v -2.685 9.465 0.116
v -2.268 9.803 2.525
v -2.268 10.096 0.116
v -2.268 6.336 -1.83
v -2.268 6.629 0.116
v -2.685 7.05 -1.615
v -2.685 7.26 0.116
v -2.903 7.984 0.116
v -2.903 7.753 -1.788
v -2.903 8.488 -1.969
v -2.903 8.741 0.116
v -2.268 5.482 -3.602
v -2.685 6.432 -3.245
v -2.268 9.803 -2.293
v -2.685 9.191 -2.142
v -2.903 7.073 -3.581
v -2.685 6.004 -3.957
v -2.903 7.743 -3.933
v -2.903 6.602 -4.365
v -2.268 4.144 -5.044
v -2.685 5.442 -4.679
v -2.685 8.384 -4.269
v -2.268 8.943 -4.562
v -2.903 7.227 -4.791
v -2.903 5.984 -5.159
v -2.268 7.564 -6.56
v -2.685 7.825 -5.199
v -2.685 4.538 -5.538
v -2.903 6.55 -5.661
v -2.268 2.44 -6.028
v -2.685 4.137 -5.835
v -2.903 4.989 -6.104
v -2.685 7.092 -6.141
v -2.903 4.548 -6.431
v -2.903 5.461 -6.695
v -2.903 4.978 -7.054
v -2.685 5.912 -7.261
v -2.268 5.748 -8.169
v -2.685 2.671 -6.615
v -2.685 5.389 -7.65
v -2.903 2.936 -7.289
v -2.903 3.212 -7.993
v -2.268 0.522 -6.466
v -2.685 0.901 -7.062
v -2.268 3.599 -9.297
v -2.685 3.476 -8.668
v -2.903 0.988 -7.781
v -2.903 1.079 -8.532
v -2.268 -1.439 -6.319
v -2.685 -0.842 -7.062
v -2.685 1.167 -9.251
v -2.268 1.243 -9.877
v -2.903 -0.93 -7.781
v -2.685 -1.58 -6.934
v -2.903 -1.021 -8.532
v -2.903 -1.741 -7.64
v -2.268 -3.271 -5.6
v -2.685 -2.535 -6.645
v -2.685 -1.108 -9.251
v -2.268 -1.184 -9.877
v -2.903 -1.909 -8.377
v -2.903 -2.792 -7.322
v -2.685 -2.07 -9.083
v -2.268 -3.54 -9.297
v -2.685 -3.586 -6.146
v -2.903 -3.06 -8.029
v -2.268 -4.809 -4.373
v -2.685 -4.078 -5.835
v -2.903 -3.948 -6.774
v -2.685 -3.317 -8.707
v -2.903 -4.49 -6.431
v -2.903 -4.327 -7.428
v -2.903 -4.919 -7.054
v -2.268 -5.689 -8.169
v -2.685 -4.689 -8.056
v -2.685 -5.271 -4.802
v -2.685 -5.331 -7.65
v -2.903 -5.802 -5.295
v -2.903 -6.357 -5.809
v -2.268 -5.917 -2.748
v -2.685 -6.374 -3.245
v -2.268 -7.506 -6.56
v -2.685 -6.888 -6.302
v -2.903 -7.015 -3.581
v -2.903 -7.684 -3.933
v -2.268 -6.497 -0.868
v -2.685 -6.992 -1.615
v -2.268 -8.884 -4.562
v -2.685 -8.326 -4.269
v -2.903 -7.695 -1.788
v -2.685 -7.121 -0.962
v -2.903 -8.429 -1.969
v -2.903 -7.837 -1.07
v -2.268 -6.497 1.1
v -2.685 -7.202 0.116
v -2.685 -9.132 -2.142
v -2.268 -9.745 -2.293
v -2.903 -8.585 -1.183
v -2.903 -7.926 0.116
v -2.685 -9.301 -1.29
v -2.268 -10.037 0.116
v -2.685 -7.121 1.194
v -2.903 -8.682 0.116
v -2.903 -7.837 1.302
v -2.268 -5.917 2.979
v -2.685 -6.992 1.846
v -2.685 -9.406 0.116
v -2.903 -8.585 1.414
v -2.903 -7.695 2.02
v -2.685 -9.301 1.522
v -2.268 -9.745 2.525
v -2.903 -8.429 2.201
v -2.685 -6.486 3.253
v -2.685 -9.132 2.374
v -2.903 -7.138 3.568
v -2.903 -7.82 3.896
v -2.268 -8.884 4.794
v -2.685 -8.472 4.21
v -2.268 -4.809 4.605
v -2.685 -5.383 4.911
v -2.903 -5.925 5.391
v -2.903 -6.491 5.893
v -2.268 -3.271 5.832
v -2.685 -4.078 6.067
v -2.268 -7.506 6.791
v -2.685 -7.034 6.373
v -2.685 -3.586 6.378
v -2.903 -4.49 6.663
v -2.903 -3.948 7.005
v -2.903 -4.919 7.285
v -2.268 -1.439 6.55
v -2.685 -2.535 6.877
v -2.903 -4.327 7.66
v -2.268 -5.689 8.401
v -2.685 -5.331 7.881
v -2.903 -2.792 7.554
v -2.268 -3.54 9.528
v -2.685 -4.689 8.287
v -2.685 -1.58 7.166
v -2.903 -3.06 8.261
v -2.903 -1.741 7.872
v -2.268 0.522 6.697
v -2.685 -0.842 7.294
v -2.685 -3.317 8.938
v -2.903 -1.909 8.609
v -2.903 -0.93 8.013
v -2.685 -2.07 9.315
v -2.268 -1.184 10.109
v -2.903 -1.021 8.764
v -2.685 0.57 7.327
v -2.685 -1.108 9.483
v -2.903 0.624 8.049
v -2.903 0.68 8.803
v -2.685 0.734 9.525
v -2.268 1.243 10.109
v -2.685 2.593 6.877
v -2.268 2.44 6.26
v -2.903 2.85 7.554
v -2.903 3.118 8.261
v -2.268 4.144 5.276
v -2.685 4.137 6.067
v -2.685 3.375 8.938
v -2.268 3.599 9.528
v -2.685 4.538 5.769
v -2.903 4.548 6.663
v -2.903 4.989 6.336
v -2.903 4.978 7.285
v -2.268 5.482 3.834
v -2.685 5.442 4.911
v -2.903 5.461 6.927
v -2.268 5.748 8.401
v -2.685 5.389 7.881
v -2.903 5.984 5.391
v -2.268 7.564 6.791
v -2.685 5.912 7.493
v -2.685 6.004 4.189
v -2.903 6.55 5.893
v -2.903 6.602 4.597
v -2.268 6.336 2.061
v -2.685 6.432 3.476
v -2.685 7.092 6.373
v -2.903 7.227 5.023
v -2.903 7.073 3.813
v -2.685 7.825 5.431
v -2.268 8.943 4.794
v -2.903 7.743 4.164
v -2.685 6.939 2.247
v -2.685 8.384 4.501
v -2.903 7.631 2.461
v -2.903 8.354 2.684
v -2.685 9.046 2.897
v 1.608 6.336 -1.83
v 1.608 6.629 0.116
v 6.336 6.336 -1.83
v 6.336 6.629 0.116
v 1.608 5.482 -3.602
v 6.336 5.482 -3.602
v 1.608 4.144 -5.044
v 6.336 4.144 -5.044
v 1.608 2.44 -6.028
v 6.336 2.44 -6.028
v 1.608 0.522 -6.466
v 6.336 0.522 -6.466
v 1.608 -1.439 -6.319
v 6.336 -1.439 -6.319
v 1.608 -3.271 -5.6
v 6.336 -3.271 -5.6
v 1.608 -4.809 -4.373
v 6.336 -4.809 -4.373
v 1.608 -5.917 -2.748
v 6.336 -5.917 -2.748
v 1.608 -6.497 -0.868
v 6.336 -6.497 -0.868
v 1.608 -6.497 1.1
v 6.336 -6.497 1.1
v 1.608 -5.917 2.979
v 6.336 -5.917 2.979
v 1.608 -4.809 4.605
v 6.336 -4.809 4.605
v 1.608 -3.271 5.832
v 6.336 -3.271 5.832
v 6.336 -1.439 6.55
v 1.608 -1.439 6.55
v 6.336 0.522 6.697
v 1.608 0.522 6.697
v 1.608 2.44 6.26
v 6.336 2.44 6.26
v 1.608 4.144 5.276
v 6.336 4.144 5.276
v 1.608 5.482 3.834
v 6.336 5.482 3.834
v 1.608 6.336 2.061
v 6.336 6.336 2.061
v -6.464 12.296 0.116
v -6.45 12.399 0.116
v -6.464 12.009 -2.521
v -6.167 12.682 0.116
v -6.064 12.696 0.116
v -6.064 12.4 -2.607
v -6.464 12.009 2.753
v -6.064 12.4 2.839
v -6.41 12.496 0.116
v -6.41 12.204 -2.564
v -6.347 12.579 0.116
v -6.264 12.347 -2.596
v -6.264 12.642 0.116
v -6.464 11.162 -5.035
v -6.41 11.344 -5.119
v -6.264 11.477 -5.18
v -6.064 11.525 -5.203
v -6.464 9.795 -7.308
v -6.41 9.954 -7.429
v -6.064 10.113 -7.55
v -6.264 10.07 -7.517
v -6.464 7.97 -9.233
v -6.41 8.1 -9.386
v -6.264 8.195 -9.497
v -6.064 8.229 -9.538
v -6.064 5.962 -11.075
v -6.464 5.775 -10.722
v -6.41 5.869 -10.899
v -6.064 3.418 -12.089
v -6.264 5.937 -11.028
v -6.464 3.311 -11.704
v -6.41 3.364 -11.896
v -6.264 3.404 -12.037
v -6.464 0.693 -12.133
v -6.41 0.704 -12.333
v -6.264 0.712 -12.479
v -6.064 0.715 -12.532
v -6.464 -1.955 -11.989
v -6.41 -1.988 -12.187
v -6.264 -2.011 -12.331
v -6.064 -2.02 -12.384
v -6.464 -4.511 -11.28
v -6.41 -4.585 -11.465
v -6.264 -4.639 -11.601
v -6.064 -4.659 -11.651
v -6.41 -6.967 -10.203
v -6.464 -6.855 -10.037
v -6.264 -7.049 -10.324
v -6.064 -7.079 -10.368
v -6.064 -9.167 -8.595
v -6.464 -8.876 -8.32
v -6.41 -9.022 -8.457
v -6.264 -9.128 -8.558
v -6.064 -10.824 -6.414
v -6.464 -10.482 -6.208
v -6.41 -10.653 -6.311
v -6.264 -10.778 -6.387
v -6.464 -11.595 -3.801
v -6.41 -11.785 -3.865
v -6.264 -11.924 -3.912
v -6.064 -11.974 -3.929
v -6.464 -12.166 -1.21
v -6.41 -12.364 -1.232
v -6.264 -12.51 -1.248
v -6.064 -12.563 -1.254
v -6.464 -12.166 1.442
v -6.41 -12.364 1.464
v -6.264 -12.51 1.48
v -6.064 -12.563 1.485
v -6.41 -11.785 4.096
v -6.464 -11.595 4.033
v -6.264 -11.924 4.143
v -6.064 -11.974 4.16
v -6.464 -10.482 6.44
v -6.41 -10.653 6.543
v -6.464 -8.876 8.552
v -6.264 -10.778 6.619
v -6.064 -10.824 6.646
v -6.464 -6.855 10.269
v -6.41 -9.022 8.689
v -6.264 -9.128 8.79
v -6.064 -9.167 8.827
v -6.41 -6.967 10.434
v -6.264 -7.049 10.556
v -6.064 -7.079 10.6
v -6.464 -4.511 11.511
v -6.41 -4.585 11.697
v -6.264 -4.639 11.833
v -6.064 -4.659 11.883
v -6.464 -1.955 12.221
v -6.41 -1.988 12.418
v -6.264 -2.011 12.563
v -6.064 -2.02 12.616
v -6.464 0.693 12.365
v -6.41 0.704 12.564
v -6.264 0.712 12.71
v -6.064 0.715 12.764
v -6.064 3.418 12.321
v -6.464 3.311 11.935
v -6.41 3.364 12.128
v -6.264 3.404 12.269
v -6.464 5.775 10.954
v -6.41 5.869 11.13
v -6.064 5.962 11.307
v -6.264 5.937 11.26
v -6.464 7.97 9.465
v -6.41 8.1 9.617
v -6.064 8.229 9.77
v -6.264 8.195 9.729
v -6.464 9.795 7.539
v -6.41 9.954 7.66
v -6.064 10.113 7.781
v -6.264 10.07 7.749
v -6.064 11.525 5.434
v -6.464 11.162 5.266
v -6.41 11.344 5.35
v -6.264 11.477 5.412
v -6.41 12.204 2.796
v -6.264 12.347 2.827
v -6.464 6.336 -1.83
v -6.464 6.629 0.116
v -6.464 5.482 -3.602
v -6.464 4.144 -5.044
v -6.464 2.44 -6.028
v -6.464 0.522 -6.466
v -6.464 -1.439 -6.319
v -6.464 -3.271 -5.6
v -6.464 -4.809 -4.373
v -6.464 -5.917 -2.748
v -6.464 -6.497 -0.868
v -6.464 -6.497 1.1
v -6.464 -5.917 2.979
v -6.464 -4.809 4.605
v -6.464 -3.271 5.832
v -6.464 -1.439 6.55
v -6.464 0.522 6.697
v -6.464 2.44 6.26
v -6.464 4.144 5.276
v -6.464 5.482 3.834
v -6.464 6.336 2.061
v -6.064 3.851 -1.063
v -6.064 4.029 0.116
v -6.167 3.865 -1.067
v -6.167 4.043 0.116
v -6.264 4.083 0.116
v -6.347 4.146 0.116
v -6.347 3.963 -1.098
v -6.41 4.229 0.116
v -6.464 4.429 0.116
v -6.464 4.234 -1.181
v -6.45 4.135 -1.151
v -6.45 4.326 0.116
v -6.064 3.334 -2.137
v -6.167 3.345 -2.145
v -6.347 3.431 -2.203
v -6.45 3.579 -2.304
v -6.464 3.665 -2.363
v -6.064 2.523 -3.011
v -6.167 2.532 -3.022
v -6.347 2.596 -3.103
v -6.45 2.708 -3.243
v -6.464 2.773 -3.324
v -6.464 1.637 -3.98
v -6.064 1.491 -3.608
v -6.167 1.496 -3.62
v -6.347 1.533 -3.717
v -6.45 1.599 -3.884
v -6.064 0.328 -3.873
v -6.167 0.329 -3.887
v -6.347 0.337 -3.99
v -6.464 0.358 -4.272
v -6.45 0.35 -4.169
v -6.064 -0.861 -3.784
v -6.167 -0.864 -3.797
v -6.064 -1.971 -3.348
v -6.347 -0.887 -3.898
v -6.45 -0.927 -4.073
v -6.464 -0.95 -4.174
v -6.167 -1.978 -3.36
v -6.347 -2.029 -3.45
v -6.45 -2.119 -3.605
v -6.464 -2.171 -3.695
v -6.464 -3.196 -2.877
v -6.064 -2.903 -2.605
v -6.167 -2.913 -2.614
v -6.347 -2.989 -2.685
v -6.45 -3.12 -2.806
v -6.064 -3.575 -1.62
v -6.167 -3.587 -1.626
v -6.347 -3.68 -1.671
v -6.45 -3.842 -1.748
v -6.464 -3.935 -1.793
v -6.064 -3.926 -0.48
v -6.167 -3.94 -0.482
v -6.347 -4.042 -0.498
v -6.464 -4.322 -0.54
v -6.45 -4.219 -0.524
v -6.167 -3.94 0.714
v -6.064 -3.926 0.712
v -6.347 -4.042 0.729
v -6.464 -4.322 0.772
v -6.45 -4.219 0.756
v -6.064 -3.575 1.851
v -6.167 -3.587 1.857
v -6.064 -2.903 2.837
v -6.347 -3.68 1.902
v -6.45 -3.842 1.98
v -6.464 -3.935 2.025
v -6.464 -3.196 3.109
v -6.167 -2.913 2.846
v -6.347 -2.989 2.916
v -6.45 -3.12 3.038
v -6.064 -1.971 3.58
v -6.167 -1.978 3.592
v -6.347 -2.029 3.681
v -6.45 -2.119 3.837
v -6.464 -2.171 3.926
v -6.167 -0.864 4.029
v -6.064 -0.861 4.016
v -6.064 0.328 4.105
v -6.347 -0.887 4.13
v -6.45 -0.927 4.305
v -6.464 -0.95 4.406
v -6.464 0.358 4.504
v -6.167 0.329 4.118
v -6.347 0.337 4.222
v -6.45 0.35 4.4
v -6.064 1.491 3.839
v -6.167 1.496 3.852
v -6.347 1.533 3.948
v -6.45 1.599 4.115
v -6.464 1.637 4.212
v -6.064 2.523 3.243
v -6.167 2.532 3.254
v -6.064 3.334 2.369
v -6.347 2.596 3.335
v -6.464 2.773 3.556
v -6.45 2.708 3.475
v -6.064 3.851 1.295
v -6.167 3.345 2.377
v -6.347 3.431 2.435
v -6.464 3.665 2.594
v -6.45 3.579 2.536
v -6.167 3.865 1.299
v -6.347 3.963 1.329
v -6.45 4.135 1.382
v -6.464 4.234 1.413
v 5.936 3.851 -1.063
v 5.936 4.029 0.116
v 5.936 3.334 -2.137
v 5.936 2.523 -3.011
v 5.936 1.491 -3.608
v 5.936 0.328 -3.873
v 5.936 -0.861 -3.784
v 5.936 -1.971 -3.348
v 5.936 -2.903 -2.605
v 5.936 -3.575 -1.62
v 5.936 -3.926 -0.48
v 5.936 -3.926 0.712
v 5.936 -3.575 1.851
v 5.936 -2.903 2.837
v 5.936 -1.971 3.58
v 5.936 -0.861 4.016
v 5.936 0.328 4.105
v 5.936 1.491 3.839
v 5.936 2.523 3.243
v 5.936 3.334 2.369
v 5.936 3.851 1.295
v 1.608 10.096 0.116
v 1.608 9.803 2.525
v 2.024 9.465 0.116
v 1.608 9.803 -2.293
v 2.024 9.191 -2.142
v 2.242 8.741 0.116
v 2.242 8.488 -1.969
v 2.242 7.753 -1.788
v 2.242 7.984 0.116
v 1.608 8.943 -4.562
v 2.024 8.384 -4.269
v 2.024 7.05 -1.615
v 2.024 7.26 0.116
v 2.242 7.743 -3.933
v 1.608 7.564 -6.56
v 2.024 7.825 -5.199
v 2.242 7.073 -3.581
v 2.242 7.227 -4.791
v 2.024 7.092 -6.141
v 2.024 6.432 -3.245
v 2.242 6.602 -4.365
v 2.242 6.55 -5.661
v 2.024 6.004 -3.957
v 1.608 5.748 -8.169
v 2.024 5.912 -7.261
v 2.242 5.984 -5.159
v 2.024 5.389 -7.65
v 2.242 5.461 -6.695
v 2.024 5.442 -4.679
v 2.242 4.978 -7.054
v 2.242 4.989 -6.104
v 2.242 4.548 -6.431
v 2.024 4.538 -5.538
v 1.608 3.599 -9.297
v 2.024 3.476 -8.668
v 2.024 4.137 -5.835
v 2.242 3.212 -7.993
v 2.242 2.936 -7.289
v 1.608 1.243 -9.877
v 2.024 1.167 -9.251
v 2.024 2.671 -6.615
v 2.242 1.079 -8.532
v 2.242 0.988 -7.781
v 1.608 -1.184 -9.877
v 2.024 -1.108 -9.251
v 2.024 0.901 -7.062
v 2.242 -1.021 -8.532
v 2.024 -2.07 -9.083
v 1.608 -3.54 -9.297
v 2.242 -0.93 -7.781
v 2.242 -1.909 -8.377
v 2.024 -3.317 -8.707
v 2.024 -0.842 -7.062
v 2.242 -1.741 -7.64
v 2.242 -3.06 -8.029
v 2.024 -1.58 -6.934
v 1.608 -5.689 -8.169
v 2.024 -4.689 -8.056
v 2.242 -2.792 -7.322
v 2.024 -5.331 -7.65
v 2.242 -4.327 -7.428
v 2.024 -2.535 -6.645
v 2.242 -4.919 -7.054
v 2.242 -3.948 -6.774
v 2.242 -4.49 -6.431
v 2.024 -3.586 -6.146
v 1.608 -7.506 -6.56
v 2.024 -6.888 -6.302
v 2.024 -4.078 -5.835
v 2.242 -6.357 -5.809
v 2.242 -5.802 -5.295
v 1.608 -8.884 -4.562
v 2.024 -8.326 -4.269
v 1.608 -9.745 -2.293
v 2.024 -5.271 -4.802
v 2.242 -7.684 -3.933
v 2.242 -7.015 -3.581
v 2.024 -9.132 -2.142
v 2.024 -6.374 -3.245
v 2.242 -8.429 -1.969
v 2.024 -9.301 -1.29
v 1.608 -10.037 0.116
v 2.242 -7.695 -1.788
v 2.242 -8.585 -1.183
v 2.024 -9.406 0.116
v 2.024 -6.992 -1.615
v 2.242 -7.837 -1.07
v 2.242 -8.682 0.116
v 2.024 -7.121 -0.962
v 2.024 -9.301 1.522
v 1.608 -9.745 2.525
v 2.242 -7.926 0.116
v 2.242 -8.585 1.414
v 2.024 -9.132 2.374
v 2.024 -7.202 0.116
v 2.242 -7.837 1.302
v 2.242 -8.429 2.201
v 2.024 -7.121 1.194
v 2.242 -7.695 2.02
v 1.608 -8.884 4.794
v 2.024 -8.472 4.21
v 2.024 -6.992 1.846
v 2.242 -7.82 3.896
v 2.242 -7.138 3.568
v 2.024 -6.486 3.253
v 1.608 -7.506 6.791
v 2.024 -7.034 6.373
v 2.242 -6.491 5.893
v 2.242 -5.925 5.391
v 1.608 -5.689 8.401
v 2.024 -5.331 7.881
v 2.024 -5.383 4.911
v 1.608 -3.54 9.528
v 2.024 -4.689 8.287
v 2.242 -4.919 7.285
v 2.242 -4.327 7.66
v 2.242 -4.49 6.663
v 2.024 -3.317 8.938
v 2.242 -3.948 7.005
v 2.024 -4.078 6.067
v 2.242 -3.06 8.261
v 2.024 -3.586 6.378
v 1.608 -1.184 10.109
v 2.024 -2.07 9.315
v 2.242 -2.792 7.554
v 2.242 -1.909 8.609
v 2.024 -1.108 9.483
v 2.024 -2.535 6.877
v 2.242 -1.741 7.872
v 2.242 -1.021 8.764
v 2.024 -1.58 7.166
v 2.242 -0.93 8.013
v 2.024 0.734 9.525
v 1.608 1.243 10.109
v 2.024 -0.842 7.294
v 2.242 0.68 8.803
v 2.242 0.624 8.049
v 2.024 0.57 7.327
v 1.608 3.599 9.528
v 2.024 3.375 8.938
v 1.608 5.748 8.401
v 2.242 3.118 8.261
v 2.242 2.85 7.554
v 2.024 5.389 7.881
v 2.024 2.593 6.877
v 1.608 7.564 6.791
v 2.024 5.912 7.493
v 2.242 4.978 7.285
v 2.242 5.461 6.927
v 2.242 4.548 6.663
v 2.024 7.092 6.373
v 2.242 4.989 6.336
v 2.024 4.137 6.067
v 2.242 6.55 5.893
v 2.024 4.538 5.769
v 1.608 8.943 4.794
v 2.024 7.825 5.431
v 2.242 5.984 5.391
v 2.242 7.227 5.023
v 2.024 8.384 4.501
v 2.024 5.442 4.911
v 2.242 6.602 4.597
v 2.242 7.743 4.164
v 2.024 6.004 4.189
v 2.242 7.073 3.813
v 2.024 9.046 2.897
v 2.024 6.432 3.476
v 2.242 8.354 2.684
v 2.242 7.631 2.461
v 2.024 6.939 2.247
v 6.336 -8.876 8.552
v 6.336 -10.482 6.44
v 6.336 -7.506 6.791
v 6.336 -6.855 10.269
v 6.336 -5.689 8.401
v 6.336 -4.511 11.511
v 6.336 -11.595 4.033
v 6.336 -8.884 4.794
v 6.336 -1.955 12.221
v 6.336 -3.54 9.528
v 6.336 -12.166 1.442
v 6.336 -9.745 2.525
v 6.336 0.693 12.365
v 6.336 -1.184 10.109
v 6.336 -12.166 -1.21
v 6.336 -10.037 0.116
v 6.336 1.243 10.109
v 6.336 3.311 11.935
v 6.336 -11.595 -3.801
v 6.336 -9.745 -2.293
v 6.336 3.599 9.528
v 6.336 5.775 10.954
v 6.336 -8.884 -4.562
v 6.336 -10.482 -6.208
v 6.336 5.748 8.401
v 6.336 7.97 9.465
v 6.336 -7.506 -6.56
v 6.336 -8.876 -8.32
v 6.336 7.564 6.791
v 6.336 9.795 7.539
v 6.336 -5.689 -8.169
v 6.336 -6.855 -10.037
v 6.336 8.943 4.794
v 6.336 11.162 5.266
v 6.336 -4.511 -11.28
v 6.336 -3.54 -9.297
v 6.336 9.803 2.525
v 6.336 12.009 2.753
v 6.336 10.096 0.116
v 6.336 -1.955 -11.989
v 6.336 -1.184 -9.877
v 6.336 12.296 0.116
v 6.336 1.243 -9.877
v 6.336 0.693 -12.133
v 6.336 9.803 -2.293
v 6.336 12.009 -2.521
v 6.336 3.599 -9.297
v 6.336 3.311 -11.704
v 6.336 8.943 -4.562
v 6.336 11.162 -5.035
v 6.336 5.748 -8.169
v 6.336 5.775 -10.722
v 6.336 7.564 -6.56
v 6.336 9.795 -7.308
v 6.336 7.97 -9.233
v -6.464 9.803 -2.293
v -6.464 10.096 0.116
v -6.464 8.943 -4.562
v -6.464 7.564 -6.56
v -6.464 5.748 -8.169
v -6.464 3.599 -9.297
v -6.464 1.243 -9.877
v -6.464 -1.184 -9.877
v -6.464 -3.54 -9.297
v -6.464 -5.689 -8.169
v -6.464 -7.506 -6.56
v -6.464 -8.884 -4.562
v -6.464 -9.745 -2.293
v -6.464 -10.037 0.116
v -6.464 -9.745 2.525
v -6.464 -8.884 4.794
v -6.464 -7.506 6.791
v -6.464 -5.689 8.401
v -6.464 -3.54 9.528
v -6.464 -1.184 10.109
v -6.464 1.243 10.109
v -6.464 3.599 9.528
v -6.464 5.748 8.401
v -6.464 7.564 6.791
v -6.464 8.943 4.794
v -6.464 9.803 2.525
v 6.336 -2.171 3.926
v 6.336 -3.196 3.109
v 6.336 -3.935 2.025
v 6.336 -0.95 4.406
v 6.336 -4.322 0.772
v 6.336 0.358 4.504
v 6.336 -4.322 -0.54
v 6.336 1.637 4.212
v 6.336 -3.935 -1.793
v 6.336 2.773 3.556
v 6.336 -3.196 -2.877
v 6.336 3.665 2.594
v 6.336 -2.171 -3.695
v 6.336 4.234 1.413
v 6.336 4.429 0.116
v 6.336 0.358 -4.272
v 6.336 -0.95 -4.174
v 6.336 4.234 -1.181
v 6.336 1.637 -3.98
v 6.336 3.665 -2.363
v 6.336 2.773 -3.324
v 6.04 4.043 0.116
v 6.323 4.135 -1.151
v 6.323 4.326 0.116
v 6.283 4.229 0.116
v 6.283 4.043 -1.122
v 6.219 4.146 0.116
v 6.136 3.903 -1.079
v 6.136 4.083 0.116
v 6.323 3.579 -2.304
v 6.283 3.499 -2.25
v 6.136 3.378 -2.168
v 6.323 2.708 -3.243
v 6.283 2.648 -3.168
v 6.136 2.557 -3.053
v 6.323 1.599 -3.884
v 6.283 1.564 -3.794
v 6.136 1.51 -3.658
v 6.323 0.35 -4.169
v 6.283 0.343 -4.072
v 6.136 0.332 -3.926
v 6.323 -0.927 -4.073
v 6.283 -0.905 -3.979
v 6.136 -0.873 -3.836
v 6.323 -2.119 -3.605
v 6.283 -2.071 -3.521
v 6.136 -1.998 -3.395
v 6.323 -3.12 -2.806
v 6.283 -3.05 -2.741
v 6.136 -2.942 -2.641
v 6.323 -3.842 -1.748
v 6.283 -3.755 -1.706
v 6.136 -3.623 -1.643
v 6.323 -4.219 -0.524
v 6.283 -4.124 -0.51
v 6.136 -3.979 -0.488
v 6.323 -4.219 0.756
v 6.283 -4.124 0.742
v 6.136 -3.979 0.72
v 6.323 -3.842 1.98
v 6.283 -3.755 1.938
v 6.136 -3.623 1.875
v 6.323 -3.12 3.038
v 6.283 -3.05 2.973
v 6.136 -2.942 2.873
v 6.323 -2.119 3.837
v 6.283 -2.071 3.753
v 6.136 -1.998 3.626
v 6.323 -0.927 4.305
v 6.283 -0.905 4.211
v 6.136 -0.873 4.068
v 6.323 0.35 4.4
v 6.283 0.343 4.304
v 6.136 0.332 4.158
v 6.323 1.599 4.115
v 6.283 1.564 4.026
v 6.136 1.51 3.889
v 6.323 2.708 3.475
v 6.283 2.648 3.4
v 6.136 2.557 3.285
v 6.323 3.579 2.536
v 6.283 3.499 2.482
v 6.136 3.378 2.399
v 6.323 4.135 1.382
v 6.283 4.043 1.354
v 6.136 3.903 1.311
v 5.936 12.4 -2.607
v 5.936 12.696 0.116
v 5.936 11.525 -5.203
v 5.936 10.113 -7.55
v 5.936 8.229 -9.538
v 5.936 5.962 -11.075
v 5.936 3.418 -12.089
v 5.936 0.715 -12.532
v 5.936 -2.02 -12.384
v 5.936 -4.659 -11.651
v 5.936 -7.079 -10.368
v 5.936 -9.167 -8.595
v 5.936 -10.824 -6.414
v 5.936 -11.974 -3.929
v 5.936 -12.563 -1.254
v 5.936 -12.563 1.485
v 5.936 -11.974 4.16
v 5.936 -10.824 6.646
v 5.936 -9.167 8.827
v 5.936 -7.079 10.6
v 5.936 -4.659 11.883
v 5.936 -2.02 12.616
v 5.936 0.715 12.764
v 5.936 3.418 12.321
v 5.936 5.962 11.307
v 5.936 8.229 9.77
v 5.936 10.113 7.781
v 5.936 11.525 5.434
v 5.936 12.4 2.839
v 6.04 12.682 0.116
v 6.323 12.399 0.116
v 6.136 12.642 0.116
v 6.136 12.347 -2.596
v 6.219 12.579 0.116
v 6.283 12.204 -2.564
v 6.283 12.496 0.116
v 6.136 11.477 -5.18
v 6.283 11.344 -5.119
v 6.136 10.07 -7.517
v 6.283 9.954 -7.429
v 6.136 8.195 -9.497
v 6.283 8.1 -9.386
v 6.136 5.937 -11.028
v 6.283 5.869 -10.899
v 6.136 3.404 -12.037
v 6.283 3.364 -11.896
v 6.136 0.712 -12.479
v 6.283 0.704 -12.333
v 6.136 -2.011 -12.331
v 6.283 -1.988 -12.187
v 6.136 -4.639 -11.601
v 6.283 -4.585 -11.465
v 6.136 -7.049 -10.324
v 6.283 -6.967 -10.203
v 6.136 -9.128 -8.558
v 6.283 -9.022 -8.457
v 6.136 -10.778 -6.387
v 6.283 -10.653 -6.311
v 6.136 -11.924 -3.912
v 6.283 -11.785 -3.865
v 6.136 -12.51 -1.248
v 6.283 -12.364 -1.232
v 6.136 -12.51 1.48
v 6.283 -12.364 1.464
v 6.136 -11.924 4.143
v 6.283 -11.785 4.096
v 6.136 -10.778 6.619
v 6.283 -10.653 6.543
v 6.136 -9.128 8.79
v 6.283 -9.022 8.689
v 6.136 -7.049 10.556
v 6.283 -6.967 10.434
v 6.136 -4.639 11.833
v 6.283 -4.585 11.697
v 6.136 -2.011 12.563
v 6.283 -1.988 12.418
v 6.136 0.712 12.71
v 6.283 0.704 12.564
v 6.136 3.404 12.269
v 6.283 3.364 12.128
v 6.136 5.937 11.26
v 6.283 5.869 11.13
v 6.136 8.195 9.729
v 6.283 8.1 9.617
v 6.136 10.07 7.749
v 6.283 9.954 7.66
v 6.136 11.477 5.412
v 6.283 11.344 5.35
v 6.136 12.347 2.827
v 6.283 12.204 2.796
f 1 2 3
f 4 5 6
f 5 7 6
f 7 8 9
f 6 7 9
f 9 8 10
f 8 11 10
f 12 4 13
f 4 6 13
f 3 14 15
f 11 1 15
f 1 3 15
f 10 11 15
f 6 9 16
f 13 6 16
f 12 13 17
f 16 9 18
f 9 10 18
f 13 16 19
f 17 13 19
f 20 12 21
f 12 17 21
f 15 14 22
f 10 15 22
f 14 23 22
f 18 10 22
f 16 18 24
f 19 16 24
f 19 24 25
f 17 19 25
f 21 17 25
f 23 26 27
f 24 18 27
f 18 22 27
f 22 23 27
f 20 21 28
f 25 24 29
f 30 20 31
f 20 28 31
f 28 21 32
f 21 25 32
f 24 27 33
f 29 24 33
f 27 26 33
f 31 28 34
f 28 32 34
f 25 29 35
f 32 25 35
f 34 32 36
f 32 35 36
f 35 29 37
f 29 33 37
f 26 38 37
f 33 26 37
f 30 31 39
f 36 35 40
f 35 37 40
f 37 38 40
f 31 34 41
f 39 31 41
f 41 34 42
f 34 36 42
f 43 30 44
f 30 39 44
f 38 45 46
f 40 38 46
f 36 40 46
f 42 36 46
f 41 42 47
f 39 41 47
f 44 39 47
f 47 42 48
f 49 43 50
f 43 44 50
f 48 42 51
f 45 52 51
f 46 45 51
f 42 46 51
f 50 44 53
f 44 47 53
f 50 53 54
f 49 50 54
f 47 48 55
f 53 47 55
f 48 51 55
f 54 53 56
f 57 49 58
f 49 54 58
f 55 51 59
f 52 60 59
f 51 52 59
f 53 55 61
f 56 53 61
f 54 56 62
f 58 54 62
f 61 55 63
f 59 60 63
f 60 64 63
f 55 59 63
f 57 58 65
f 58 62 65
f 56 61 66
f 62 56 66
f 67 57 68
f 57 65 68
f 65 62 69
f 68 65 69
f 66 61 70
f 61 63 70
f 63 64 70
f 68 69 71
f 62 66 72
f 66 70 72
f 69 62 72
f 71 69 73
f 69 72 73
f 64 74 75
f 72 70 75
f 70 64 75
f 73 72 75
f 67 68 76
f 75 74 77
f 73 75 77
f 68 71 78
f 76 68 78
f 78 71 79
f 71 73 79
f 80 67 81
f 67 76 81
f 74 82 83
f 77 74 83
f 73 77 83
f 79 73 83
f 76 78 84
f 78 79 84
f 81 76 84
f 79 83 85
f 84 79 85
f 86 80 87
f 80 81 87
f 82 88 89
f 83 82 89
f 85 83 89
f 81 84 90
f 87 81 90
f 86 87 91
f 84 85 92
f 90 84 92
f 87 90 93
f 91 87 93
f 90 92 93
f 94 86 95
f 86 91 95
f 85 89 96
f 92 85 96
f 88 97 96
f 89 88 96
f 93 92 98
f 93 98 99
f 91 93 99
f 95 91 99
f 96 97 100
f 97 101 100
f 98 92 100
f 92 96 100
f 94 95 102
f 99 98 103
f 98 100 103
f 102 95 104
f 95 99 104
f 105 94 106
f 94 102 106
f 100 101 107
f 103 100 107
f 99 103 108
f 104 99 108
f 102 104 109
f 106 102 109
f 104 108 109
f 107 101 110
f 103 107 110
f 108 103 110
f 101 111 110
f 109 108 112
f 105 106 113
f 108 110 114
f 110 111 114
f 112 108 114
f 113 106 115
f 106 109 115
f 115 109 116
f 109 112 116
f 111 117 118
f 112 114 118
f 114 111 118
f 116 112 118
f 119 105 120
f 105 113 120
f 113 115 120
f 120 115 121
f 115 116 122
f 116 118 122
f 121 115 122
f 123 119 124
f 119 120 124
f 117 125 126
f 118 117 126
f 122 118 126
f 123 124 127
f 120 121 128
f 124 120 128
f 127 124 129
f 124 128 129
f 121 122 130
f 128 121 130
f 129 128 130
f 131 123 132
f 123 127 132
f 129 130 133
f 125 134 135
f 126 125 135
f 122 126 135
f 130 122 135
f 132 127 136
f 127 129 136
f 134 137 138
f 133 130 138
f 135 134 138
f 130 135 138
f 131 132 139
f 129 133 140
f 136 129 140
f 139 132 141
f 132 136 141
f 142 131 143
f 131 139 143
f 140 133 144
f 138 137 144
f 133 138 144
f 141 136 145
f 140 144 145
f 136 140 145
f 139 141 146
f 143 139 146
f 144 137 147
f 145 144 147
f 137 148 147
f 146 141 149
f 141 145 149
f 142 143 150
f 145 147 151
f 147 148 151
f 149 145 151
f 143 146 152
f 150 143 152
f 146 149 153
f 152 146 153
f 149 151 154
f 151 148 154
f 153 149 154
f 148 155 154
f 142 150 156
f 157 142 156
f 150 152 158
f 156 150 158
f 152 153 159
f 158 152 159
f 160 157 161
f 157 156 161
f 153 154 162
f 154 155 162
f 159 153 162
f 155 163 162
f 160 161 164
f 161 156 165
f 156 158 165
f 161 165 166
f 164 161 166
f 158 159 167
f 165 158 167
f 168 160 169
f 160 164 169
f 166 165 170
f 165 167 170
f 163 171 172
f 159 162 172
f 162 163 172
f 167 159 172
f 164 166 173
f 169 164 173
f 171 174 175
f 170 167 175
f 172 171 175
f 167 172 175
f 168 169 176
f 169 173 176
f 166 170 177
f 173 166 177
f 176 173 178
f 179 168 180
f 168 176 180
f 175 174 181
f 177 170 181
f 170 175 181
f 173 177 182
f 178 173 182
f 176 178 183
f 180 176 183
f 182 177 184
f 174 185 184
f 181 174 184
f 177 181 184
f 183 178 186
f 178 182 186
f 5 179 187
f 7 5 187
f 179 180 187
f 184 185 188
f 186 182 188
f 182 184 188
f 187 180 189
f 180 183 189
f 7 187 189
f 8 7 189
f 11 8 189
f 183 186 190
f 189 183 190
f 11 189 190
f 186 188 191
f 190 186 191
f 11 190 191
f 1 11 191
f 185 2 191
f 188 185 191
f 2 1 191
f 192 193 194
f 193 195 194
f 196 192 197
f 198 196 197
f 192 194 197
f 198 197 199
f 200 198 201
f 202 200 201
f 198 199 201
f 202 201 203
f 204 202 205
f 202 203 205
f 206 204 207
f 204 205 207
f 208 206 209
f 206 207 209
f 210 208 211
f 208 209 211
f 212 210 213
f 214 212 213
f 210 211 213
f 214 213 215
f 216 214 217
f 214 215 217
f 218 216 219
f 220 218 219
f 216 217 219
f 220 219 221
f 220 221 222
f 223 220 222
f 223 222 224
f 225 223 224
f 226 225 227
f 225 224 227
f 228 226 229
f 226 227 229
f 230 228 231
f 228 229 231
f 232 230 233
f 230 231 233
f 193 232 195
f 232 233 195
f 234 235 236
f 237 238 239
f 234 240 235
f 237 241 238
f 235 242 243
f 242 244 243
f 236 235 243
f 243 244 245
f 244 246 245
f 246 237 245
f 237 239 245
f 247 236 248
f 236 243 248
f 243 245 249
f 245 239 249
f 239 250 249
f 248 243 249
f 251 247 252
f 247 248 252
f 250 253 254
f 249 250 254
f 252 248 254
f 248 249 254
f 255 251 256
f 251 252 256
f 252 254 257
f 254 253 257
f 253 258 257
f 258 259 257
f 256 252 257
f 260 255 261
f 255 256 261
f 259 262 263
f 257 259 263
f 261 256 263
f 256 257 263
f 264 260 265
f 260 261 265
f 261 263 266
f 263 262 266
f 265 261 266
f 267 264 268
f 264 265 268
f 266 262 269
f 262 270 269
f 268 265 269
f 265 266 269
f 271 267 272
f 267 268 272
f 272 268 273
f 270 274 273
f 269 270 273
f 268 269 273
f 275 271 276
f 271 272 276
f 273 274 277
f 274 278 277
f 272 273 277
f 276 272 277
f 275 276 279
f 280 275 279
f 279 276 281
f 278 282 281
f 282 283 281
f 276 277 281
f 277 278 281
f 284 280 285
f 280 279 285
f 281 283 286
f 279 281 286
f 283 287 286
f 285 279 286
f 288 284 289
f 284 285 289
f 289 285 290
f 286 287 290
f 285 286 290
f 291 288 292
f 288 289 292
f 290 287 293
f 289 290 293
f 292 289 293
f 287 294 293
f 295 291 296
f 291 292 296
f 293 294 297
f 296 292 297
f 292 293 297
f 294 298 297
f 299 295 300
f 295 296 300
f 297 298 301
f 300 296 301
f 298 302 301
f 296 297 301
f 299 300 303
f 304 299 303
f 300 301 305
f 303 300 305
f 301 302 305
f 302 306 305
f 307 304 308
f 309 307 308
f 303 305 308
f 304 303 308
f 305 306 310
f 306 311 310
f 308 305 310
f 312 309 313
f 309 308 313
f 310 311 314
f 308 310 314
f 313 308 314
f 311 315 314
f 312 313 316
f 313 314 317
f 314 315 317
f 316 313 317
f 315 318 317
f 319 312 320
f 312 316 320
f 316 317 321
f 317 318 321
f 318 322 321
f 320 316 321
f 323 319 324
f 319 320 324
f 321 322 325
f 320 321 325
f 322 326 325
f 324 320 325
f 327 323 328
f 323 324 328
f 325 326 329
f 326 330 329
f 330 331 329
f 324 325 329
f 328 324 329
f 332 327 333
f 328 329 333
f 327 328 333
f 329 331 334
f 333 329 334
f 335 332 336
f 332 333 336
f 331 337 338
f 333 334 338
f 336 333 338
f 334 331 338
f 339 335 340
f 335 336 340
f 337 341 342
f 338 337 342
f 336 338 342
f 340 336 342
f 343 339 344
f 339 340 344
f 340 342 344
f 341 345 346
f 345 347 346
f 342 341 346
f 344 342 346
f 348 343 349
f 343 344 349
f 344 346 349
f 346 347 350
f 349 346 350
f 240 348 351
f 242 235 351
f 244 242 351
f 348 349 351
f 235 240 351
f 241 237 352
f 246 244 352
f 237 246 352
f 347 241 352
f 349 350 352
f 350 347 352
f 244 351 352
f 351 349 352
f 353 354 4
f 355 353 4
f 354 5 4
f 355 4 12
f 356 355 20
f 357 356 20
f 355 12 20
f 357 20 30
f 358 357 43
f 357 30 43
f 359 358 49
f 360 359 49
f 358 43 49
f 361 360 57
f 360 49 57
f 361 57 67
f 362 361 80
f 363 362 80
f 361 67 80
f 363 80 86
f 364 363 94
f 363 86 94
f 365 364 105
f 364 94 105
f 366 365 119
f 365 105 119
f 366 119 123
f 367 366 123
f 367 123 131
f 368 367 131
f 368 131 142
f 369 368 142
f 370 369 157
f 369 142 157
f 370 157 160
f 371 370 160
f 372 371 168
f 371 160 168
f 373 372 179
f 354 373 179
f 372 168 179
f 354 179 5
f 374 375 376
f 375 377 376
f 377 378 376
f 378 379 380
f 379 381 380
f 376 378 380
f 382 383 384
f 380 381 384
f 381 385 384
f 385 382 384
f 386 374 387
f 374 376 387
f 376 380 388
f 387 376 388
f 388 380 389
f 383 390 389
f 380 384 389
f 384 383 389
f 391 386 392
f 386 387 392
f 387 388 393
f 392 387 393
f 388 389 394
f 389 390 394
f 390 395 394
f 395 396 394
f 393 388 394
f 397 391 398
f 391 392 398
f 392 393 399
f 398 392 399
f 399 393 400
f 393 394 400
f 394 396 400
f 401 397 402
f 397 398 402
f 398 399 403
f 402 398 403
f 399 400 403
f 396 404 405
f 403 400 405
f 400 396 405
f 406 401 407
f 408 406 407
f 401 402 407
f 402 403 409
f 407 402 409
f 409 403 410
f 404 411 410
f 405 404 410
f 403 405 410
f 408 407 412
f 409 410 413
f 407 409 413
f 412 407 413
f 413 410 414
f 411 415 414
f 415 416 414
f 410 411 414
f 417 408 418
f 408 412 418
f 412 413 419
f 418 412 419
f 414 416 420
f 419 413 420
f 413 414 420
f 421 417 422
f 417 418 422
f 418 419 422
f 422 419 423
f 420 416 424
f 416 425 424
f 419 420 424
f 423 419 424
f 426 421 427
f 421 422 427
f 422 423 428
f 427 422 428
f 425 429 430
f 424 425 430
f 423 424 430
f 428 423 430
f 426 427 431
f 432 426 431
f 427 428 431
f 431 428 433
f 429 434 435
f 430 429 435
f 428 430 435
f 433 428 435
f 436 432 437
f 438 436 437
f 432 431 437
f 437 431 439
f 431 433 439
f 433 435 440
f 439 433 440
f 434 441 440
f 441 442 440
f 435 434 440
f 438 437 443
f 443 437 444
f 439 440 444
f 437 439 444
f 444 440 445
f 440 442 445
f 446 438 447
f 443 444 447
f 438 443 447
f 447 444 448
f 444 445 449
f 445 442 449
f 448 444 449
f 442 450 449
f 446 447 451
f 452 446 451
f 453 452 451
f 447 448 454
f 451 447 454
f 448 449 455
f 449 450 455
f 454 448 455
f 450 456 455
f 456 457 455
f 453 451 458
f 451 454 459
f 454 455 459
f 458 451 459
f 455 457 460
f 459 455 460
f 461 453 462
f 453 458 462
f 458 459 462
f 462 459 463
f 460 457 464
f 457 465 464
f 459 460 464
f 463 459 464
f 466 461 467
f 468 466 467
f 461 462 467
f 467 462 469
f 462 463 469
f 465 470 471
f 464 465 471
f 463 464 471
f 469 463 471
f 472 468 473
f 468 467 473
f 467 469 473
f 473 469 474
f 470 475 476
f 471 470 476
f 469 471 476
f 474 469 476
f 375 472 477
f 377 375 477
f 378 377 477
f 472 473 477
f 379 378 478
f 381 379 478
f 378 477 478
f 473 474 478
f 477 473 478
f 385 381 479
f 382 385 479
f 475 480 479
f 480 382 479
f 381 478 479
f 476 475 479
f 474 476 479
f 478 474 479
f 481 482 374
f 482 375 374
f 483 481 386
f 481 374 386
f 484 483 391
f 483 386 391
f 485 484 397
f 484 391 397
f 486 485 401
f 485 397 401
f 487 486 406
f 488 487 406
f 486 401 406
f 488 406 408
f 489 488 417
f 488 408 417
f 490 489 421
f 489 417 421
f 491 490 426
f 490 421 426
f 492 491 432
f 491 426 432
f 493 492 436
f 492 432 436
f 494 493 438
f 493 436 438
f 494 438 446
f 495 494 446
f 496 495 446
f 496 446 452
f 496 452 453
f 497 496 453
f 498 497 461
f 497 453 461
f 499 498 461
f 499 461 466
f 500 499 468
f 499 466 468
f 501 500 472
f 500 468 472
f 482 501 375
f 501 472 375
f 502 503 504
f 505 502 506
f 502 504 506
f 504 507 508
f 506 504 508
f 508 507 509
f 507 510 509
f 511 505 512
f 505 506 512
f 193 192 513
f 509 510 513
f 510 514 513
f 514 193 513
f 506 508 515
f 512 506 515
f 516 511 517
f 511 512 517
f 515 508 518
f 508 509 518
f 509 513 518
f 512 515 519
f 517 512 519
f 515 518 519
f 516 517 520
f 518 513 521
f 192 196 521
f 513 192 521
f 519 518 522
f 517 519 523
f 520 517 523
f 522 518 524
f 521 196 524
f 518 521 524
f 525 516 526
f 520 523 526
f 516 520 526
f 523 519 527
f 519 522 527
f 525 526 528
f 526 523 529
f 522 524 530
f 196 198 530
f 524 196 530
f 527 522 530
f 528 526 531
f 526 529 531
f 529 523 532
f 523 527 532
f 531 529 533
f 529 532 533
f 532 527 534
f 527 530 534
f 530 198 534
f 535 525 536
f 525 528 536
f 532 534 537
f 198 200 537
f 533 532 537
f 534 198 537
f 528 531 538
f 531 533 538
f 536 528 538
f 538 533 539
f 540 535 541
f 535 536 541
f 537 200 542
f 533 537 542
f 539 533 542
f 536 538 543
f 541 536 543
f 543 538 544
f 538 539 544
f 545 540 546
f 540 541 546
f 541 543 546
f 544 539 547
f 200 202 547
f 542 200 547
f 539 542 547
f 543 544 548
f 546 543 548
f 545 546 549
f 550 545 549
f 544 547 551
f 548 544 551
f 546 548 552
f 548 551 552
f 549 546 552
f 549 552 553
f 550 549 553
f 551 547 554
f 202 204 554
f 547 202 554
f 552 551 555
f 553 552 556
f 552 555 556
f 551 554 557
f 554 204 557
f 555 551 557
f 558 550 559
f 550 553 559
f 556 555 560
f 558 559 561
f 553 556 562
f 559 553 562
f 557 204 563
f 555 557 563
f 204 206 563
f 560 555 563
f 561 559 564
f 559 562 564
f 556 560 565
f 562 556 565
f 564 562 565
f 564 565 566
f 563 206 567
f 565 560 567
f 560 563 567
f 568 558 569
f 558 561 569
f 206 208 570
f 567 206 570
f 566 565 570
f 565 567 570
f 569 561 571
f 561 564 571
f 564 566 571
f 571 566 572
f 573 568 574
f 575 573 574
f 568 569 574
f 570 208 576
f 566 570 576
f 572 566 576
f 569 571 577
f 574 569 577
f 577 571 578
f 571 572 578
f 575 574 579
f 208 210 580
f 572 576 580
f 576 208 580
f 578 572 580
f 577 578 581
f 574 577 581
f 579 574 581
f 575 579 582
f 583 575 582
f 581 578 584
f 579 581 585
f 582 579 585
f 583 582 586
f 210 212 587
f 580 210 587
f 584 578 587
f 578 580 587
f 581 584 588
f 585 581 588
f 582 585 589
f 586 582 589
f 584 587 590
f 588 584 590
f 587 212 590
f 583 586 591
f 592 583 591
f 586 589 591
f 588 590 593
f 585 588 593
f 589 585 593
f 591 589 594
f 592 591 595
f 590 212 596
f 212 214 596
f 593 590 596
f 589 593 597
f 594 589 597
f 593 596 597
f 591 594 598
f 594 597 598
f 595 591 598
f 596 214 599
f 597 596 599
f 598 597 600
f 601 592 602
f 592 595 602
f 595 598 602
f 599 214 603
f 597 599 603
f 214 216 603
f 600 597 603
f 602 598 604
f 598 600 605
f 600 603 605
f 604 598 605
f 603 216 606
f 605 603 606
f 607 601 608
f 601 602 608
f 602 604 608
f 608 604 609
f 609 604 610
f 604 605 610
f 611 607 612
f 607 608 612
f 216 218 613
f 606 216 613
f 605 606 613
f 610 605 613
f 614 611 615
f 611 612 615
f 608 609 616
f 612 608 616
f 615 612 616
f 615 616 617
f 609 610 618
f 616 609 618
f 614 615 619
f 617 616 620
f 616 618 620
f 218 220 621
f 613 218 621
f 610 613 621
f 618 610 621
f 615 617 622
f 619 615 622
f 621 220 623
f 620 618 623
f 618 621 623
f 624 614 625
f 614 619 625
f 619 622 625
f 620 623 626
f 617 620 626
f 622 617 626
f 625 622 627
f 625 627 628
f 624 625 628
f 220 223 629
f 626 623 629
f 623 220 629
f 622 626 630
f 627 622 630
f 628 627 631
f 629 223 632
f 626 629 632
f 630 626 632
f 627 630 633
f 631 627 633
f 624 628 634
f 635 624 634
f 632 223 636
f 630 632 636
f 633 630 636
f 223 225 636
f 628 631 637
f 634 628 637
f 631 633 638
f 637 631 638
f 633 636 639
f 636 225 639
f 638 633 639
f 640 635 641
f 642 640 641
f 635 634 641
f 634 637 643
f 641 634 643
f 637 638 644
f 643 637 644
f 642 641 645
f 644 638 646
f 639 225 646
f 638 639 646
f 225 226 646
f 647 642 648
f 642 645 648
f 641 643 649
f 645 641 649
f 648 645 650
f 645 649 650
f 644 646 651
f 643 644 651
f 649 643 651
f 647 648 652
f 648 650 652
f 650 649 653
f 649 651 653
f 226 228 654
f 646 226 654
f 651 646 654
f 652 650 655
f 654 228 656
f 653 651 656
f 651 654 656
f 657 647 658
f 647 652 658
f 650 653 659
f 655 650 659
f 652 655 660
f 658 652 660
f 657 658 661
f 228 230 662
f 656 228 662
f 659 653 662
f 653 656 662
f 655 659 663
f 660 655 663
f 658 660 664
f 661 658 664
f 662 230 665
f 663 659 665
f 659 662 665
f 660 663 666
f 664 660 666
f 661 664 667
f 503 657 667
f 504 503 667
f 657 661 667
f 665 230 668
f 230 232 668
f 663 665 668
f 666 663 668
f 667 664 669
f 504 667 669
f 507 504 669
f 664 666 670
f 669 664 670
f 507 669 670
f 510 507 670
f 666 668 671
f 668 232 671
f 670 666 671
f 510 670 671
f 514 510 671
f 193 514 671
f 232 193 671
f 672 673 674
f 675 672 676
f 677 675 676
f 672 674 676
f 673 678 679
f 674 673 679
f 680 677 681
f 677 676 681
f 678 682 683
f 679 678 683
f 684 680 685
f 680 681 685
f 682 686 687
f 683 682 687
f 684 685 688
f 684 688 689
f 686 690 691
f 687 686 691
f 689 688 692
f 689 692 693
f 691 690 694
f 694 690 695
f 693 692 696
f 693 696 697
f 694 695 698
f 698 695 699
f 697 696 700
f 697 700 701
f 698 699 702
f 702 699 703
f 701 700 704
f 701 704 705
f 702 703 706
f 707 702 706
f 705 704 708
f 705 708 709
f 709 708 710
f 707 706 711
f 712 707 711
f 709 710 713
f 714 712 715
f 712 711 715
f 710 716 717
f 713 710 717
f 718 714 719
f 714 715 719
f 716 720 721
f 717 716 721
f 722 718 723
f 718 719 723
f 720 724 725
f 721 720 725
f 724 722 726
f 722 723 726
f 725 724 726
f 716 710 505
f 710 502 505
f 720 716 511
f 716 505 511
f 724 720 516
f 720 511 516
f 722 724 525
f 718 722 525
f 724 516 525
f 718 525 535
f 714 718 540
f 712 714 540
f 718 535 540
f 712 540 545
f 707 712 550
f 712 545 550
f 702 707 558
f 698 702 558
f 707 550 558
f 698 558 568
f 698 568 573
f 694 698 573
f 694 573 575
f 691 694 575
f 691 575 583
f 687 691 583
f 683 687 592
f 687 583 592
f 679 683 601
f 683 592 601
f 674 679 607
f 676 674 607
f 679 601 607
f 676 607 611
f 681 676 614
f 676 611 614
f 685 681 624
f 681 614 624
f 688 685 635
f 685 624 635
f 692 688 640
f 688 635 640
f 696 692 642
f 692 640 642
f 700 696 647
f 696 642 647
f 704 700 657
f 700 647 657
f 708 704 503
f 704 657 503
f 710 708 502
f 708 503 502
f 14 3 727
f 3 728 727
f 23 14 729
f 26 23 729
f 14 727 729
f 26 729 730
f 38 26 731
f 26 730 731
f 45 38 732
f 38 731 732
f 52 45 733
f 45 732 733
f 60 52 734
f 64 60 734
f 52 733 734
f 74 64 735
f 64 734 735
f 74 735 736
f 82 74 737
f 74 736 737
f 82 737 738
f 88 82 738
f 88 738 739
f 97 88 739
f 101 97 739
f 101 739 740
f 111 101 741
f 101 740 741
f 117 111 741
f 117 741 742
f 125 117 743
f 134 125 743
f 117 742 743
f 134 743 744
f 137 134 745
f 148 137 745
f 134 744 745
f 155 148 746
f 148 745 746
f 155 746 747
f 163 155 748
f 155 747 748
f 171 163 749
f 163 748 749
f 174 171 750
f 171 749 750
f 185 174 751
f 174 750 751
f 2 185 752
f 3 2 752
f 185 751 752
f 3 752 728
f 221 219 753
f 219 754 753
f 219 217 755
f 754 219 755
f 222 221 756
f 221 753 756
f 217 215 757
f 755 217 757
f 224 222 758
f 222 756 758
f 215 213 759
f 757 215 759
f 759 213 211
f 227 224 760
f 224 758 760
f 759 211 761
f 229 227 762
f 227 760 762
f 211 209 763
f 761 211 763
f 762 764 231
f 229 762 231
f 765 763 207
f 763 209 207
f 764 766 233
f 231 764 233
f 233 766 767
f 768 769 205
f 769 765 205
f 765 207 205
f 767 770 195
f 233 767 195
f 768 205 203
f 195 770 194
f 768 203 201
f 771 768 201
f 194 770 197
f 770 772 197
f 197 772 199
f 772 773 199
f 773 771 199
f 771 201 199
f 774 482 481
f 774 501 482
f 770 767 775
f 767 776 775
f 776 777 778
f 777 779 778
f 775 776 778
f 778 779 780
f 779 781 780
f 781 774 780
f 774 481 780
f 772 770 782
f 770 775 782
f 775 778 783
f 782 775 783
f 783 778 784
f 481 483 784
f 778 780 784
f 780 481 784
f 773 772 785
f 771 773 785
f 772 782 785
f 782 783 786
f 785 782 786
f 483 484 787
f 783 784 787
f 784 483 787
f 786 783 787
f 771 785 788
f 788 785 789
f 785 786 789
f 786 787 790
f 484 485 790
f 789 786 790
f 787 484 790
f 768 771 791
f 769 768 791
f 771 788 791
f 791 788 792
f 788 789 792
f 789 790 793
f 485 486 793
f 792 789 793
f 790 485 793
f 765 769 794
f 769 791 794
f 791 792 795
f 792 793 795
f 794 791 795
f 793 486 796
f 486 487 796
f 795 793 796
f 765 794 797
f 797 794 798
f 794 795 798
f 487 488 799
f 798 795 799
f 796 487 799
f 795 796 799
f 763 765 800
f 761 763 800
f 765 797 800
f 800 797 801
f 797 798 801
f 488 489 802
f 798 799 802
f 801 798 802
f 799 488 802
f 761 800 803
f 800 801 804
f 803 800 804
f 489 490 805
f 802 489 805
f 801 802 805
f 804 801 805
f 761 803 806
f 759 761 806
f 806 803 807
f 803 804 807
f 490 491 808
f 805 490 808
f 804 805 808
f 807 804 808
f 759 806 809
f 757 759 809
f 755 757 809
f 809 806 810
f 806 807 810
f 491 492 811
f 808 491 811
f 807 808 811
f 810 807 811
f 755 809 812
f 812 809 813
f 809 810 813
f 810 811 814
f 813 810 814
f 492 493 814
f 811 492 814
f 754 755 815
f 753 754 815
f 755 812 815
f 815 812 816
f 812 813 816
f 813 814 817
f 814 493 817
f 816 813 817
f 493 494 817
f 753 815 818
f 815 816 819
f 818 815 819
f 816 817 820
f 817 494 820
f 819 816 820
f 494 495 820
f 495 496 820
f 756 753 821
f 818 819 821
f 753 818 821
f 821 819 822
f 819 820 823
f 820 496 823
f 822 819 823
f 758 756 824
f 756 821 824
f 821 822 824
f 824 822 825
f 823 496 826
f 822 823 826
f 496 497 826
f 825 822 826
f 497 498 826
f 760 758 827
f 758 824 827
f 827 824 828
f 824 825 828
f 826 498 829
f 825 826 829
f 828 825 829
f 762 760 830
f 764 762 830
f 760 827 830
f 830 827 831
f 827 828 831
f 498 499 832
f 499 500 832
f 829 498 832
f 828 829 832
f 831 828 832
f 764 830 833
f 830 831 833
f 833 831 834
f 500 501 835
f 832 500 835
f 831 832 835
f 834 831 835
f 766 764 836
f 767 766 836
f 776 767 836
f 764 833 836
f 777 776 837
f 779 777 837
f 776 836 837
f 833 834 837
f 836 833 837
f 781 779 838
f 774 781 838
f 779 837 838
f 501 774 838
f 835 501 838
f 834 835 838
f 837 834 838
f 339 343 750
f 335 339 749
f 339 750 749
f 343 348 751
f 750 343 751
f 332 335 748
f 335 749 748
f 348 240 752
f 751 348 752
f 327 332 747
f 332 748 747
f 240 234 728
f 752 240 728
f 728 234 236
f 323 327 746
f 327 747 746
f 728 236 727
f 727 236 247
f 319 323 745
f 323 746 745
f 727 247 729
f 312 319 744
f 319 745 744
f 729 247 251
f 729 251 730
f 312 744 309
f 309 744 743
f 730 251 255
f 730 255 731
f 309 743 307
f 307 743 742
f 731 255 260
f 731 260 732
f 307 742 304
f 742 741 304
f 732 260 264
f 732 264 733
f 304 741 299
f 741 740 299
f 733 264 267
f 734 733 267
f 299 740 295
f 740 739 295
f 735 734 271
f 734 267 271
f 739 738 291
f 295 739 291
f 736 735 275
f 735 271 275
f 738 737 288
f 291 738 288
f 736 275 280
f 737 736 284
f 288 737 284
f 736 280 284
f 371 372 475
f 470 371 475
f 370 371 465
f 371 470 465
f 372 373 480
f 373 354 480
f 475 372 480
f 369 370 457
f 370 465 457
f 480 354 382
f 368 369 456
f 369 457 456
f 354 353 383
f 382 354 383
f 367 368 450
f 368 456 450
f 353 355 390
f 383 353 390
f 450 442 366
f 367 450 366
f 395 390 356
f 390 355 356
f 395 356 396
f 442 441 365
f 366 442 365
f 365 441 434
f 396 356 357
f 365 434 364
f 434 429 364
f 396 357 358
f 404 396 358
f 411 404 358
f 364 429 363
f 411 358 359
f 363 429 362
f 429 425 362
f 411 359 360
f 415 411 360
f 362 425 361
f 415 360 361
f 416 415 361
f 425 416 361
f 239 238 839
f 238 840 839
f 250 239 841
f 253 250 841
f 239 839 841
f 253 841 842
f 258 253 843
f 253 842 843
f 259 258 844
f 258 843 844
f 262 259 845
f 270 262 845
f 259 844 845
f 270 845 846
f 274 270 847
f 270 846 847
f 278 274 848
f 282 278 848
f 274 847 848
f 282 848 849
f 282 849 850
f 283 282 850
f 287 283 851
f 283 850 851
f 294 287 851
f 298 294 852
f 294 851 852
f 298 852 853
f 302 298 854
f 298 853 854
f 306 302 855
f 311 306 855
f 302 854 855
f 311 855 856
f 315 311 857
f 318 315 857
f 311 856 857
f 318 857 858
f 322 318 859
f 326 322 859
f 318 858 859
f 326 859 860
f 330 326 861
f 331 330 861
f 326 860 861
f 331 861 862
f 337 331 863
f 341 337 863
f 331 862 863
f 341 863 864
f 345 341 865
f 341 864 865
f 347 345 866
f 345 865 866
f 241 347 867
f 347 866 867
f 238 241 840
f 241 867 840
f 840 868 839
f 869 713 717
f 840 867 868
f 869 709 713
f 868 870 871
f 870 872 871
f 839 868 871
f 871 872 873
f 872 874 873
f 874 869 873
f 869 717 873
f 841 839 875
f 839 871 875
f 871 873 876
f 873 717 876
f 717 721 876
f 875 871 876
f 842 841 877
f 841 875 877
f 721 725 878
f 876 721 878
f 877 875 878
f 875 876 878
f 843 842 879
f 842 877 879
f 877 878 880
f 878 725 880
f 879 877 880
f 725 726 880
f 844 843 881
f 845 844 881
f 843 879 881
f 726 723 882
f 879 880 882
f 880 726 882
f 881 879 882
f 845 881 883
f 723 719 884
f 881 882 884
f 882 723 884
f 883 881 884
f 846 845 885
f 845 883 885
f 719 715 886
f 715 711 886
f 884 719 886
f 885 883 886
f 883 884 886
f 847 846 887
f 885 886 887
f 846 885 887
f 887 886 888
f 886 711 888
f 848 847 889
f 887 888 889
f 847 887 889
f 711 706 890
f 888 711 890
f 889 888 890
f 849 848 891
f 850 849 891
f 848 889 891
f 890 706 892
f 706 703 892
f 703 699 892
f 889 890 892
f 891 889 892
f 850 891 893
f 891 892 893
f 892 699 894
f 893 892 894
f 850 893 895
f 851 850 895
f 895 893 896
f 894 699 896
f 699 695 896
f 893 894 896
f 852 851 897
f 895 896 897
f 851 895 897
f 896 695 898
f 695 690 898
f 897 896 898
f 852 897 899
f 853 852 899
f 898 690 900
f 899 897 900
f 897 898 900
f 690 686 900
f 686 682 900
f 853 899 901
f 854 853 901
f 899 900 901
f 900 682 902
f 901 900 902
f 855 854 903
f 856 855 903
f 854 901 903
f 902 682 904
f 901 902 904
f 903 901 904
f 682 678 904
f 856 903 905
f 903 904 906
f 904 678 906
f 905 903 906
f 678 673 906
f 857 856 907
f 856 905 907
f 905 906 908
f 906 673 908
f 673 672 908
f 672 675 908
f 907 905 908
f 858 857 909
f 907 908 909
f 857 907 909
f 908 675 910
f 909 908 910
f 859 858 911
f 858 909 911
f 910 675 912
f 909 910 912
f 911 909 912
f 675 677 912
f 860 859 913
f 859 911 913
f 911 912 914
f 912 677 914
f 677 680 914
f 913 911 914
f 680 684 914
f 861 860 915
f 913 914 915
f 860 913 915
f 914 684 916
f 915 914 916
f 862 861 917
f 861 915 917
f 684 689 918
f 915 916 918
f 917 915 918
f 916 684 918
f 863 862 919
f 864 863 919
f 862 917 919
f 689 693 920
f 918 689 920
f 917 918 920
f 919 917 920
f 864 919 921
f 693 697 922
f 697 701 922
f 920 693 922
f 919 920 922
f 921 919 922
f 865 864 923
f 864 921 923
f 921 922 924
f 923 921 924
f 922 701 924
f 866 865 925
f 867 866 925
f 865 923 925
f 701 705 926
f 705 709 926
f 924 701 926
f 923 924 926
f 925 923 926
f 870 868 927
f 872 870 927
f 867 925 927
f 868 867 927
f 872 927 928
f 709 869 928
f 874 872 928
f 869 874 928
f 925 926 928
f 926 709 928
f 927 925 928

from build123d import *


with BuildPart() as part:
    # Sketch1 → Revolve1 (revolve)
    with BuildSketch(Plane(origin=(0, 0, 0.115859753), x_dir=(-1, 0, 0), z_dir=(0, 0, -1))):
        with BuildLine():
            Line((-1.607580359, 6.629201388), (-6.336321445, 6.629201388))
            Line((-6.336321445, 6.629201388), (-6.336321445, 4.429201388))
            ThreePointArc((-6.336321445, 4.429201388), (-6.219164158, 4.146358676), (-5.936321445, 4.029201388))
            Line((-5.936321445, 4.029201388), (6.063678555, 4.029201388))
            ThreePointArc((6.063678555, 4.029201388), (6.346521267, 4.146358676), (6.463678555, 4.429201388))
            Line((6.463678555, 4.429201388), (6.463678555, 6.629201388))
            Line((6.463678555, 6.629201388), (2.268270802, 6.629201388))
            ThreePointArc((2.268270802, 6.629201388), (2.930345222, 8.362534721), (2.268270802, 10.095868055))
            Line((2.268270802, 10.095868055), (6.463678555, 10.095868055))
            Line((6.463678555, 10.095868055), (6.463678555, 12.295868055))
            ThreePointArc((6.463678555, 12.295868055), (6.346521267, 12.578710767), (6.063678555, 12.695868055))
            Line((6.063678555, 12.695868055), (-5.936321445, 12.695868055))
            ThreePointArc((-5.936321445, 12.695868055), (-6.219164158, 12.578710767), (-6.336321445, 12.295868055))
            Line((-6.336321445, 12.295868055), (-6.336321445, 10.095868055))
            Line((-6.336321445, 10.095868055), (-1.607580359, 10.095868055))
            ThreePointArc((-1.607580359, 10.095868055), (-2.269654778, 8.362534721), (-1.607580359, 6.629201388))
        make_face()
    revolve(axis=Axis((6.336321445, 0.029201388, 0.115859753), (-1, 0, 0)))


solid = part.part
